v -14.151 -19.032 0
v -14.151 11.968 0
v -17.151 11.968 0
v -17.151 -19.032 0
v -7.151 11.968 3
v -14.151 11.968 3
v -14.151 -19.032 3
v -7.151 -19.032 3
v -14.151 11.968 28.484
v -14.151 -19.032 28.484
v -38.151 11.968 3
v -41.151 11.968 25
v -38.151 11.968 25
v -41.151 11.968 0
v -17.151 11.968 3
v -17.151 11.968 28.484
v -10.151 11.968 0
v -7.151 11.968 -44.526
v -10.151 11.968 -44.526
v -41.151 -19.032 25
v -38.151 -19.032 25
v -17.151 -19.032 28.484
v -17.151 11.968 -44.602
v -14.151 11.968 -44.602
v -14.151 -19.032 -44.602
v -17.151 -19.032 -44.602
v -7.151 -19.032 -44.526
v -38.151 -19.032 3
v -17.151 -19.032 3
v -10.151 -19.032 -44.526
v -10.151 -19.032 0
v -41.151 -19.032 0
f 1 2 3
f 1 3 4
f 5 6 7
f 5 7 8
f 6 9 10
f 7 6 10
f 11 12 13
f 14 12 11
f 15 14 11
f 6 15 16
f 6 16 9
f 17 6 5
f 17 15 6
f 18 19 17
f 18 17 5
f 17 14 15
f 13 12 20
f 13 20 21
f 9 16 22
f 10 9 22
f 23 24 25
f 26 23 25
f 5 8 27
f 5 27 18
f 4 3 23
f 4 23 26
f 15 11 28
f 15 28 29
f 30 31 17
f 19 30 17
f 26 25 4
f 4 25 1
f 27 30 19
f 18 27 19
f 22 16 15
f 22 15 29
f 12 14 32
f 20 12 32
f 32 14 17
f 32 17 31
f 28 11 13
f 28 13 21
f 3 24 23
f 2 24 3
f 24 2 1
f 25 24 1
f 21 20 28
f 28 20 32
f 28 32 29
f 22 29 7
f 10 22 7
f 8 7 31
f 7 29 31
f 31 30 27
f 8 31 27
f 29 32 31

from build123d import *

# Parameters (mm, degrees)
F0_W      = 4
F0_H      = 31
F1_DEPTH  = 3
F2_W      = 31
F2_H      = 47.5263299036
F3_DEPTH  = 3
F4_W      = 31
F4_H      = 44.6022309436
F5_DEPTH  = 3
F6_W      = 24
F6_H      = 31
F7_DEPTH  = 3
F8_W      = 3
F8_H      = 31
F9_DEPTH  = 25
F10_W     = 31
F10_H     = 28.4836739302
F11_DEPTH = 3


with BuildPart() as f1:
    # F0 (on Top) → F1 (new body)
    with BuildSketch(Plane.XY):
        with Locations((-12.1510221595, -3.5323435441)):
            Rectangle(F0_W, F0_H)
    extrude(amount=F1_DEPTH)

    # F2 (on face) → F3 (join)
    with BuildSketch(Plane.YZ.offset(-10.1510221595)):
        with Locations((-3.5323435441, -20.7631649518)):
            Rectangle(F2_W, F2_H)
    extrude(amount=F3_DEPTH)

    # F6 (on face) → F7 (join)
    with BuildSketch(Plane.XY.offset(3)):
        with Locations((-26.1510221595, -3.5323435441)):
            Rectangle(F6_W, F6_H)
    extrude(amount=-F7_DEPTH)

    # F8 (on face) → F9 (join)
    with BuildSketch(Plane(origin=(0, 0, 0), x_dir=(1, 0, 0), z_dir=(0, 0, -1))):
        with Locations((-39.6510221595, 3.5323435441)):
            Rectangle(F8_W, F8_H)
    extrude(amount=-F9_DEPTH)

    # F10 (on face) → F11 (join)
    with BuildSketch(Plane(origin=(-17.1510221595, 0, 0), x_dir=(0, -1, 0), z_dir=(-1, 0, 0))):
        with Locations((3.5323435441, 14.2418369651)):
            Rectangle(F10_W, F10_H)
    extrude(amount=-F11_DEPTH)


with BuildPart() as f5:
    # F4 (on face) → F5 (new body)
    with BuildSketch(Plane(origin=(-14.1510221595, 0, 0), x_dir=(0, -1, 0), z_dir=(-1, 0, 0))):
        with Locations((3.5323435441, -22.3011154718)):
            Rectangle(F4_W, F4_H)
    extrude(amount=F5_DEPTH)


solid = Compound([f1.part, f5.part])
